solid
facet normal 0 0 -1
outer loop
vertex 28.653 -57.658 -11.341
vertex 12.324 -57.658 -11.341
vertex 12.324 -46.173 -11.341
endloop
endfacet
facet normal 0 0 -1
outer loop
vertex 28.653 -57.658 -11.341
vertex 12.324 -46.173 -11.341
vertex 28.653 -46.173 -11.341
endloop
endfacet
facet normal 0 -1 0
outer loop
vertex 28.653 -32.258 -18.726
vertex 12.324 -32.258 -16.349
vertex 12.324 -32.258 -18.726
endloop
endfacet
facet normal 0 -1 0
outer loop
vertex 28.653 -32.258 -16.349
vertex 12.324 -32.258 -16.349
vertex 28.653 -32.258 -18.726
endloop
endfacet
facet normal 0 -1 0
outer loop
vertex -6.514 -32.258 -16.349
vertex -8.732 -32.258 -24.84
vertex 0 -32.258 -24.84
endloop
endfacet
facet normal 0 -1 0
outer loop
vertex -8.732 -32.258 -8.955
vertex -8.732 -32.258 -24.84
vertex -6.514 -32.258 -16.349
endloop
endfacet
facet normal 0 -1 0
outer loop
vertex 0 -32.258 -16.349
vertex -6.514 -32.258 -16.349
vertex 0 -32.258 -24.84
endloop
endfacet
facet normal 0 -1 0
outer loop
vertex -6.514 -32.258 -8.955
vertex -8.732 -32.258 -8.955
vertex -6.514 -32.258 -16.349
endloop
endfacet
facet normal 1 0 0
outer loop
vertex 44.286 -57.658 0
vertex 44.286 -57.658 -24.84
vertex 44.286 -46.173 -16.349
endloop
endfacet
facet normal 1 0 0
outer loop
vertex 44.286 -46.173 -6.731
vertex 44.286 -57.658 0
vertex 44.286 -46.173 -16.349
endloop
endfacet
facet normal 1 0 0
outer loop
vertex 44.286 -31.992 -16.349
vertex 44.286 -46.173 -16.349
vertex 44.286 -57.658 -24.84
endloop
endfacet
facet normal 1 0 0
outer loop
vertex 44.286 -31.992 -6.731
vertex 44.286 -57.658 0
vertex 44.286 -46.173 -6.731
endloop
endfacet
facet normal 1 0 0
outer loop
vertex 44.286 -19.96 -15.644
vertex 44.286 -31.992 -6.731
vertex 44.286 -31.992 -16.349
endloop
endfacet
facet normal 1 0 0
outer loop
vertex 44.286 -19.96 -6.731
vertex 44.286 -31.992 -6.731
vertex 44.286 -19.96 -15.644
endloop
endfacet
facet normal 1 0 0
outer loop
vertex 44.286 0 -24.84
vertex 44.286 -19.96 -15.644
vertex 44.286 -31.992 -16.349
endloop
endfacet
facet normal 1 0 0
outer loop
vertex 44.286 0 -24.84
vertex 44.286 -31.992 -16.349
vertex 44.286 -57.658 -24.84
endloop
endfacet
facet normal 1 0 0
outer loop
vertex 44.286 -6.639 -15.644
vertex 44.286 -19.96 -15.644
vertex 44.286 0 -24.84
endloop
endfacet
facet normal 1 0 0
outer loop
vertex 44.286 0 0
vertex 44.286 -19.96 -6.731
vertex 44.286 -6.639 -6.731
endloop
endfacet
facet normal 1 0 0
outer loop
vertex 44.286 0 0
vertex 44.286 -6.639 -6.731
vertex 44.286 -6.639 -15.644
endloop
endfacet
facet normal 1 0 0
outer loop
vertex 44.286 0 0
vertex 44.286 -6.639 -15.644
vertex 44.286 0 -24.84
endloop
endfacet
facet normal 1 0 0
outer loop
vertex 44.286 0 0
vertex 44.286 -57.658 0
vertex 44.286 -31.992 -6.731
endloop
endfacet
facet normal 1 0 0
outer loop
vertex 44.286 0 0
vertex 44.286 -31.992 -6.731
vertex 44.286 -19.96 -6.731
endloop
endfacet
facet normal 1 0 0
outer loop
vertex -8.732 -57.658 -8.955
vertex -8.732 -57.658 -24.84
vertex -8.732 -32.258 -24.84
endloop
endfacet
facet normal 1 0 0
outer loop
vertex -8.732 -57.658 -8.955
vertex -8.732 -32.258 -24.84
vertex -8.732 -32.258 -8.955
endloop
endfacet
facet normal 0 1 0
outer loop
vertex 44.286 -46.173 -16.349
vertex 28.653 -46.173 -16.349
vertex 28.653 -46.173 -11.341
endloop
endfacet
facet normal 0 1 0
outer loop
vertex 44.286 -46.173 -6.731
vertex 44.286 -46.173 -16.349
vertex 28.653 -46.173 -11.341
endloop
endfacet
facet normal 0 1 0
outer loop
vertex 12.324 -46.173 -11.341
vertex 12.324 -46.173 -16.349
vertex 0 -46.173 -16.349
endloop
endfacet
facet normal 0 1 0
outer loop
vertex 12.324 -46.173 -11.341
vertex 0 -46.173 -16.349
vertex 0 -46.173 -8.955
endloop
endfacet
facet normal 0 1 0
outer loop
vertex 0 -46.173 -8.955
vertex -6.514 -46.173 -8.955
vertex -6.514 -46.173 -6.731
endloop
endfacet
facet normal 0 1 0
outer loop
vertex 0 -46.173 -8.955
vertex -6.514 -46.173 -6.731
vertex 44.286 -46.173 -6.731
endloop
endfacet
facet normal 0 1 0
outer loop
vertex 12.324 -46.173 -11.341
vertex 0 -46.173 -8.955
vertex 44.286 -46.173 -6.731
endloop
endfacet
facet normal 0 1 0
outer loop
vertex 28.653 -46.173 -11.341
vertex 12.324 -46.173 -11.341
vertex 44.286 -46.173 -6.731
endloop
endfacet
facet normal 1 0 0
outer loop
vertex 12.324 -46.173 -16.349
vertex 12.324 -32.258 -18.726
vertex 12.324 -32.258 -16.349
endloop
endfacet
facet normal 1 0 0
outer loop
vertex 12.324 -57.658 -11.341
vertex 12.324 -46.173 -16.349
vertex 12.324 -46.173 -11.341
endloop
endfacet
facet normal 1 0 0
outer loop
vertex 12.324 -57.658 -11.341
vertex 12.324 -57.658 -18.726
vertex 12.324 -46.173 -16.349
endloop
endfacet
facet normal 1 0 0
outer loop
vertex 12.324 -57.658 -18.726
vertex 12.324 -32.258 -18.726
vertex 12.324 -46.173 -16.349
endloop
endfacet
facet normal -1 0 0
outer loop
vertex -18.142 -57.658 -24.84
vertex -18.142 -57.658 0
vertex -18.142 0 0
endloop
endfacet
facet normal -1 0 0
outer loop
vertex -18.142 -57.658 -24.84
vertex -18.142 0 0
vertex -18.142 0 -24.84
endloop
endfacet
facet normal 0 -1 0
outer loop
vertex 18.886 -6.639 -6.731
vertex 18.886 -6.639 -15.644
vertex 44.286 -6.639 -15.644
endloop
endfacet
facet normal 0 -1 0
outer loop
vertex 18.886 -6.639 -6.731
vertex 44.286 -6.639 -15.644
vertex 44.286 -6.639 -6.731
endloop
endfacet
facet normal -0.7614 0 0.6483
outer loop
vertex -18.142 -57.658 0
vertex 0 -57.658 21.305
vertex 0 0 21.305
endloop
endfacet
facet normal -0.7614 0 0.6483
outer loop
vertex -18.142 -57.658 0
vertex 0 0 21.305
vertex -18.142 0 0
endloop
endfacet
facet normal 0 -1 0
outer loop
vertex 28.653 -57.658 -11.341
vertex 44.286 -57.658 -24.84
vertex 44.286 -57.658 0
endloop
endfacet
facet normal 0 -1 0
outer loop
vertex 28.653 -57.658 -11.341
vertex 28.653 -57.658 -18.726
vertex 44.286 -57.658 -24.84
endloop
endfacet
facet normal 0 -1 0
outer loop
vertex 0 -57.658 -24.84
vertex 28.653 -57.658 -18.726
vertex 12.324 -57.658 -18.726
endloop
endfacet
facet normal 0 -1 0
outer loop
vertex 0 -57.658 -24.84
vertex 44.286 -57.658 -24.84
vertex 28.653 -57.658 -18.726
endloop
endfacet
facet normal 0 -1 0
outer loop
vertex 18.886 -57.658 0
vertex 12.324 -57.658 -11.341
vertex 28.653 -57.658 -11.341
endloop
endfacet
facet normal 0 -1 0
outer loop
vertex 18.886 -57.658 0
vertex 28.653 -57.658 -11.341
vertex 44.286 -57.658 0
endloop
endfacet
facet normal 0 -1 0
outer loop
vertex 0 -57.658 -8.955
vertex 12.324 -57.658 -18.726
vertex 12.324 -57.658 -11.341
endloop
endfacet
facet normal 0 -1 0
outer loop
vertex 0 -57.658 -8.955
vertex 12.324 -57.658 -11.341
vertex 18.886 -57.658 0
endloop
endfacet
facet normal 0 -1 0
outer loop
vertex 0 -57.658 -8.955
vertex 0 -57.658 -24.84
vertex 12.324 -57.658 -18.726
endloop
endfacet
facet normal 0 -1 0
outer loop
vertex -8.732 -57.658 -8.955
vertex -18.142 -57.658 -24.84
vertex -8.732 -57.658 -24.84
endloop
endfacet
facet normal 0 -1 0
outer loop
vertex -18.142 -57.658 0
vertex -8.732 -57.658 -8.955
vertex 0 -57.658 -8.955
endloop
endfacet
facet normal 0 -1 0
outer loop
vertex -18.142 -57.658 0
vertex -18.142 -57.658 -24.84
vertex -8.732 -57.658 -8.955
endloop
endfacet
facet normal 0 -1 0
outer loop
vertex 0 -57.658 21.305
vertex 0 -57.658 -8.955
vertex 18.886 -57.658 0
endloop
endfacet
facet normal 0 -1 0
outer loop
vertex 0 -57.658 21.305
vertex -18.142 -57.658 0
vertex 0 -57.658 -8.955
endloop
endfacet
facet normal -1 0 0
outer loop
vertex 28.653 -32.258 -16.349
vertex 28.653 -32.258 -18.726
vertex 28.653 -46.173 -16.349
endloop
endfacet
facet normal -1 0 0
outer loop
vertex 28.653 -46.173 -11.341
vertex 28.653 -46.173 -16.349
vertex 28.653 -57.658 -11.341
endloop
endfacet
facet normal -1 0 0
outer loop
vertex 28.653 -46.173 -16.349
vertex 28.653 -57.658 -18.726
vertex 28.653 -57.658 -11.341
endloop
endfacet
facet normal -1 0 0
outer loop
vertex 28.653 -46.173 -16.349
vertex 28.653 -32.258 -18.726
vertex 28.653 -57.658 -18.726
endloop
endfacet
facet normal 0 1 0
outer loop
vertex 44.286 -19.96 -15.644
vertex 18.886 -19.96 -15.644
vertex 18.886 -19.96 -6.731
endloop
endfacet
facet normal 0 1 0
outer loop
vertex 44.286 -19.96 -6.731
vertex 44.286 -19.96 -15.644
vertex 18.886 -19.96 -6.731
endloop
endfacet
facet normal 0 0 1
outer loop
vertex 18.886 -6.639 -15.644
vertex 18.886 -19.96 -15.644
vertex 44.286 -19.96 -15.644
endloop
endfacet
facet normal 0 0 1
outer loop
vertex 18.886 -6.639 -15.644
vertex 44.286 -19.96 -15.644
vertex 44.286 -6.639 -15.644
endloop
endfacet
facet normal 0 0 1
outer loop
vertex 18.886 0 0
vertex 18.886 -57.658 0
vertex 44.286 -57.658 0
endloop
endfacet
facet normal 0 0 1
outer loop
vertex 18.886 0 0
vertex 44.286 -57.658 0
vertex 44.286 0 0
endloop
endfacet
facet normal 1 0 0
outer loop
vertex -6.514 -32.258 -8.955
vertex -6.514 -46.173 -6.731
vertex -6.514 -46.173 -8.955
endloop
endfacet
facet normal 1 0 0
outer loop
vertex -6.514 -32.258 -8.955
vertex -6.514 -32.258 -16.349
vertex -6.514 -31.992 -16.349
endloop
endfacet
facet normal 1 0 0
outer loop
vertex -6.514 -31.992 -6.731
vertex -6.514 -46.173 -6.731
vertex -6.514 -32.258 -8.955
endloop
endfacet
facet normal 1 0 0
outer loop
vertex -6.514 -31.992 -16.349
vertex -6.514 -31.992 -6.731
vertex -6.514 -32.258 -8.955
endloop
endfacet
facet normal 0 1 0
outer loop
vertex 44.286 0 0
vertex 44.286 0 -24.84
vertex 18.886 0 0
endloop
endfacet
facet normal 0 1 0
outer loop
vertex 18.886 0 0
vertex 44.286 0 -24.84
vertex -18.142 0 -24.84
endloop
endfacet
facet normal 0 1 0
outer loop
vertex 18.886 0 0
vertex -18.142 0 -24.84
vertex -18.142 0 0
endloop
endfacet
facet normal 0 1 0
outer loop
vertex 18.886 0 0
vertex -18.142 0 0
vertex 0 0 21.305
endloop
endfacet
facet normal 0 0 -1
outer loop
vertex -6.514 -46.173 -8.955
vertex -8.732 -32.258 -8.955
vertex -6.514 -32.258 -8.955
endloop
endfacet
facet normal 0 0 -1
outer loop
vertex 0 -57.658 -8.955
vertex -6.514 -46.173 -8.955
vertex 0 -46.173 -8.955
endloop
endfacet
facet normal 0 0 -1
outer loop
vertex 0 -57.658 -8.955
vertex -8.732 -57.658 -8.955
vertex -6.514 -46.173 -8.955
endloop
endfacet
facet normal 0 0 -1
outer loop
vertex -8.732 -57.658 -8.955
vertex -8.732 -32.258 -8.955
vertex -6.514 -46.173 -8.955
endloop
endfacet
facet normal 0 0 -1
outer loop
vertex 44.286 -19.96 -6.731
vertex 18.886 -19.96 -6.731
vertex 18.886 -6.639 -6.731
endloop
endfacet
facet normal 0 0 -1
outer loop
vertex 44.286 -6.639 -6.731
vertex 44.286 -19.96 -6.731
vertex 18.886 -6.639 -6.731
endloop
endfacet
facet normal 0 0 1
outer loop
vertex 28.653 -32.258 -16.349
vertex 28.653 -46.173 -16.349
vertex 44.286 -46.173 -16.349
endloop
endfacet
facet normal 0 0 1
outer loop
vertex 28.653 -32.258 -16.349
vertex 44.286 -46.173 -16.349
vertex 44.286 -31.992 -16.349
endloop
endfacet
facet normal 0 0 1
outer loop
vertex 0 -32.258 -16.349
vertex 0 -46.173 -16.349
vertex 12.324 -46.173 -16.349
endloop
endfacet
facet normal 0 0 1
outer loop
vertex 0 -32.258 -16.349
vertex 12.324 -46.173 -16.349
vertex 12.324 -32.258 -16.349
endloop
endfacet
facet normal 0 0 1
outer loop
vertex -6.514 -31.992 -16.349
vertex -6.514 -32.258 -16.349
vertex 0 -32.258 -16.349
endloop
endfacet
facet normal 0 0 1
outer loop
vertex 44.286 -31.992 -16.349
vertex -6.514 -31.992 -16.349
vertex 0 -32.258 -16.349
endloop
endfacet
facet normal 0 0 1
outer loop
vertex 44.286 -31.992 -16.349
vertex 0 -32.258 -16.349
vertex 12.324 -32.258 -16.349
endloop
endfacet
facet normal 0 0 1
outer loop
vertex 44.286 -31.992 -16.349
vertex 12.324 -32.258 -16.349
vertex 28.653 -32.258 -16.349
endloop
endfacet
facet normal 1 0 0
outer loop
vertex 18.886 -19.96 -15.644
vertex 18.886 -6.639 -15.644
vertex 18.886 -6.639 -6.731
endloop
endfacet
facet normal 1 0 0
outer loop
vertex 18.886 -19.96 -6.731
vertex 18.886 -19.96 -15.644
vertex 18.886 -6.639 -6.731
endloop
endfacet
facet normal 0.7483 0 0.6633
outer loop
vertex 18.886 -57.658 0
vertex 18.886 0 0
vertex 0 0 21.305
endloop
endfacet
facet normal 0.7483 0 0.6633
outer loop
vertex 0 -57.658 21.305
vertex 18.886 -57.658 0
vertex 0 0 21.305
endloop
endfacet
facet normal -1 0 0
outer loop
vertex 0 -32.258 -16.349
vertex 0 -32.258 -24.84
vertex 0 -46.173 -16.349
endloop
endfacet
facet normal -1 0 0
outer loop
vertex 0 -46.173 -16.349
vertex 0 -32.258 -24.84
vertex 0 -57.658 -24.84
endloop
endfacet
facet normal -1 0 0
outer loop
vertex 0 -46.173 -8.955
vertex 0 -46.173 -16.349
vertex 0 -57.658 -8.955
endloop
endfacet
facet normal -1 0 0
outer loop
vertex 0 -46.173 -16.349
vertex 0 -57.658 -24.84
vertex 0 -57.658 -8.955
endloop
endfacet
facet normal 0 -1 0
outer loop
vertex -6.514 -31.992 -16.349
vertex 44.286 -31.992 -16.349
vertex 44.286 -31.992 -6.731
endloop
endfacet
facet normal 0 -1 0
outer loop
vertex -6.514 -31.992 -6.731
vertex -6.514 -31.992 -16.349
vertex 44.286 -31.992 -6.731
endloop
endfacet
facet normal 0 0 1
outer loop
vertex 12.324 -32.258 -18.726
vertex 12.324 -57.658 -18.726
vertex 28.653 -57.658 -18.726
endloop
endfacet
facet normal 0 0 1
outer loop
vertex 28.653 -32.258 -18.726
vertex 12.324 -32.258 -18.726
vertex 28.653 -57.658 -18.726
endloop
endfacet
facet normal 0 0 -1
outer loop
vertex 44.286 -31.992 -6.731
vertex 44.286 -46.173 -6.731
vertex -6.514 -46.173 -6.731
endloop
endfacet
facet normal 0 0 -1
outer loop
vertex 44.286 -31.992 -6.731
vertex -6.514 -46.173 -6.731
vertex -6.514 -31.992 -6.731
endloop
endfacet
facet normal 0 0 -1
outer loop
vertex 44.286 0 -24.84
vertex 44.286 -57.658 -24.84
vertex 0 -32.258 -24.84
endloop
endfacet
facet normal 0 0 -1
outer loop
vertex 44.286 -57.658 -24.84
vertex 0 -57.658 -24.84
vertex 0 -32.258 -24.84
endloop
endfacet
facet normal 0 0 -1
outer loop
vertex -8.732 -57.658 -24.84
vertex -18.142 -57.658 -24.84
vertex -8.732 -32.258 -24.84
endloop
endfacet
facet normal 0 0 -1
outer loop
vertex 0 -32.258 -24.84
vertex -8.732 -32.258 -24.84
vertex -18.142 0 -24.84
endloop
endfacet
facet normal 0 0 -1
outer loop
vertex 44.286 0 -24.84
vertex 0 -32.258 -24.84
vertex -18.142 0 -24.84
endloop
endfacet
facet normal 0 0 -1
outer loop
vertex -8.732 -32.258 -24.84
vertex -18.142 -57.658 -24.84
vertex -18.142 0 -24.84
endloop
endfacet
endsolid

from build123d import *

# Parameters (mm, degrees)
F1_DEPTH = 57.658
F2_W     = 8.732148
F2_H     = 15.885746
F3_DEPTH = 25.4
F4_W     = 14.180422
F4_H     = 9.618062
F5_DEPTH = 25.4
F6_W     = 57.658
F6_H     = 24.840316
F6_W_2   = 14.180422
F6_H_2   = 9.618062
F6_W_3   = 13.320997
F6_H_3   = 8.912906
F7_DEPTH = 25.4
F8_W     = 16.328969
F8_H     = 7.385209
F9_DEPTH = 25.4


with BuildPart() as f1:
    # F0 (on Front) → F1 (new body)
    with BuildSketch(Plane.XZ):
        Polygon((-18.141802, 0), (-18.141802, -24.840316), (18.886082, -24.840316), (18.886082, 0), (0, 21.304989), align=None)
    extrude(amount=F1_DEPTH)

    # F2 (on face) → F3 (cut)
    with BuildSketch(Plane.XZ.offset(57.658)):
        with Locations((-4.366074, -16.897443)):
            Rectangle(F2_W, F2_H)
    extrude(amount=-F3_DEPTH, mode=Mode.SUBTRACT)

    # F4 (on face) → F5 (cut)
    with BuildSketch(Plane.YZ.offset(18.886082)):
        with Locations((-39.082445, -11.540385)):
            Rectangle(F4_W, F4_H)
    extrude(amount=-F5_DEPTH, mode=Mode.SUBTRACT)

    # F6 (on face) → F7 (join)
    with BuildSketch(Plane.YZ.offset(18.886082)):
        with Locations((-28.829, -12.420158)):
            Rectangle(F6_W, F6_H)
        with Locations((-39.082445, -11.540385)):
            Rectangle(F6_W_2, F6_H_2, mode=Mode.SUBTRACT)
        with Locations((-13.299853, -11.187807)):
            Rectangle(F6_W_3, F6_H_3, mode=Mode.SUBTRACT)
    extrude(amount=F7_DEPTH)

    # F8 (on face) → F9 (cut)
    with BuildSketch(Plane.XZ.offset(57.658)):
        with Locations((20.488108, -15.033167)):
            Rectangle(F8_W, F8_H)
    extrude(amount=-F9_DEPTH, mode=Mode.SUBTRACT)


solid = f1.part
